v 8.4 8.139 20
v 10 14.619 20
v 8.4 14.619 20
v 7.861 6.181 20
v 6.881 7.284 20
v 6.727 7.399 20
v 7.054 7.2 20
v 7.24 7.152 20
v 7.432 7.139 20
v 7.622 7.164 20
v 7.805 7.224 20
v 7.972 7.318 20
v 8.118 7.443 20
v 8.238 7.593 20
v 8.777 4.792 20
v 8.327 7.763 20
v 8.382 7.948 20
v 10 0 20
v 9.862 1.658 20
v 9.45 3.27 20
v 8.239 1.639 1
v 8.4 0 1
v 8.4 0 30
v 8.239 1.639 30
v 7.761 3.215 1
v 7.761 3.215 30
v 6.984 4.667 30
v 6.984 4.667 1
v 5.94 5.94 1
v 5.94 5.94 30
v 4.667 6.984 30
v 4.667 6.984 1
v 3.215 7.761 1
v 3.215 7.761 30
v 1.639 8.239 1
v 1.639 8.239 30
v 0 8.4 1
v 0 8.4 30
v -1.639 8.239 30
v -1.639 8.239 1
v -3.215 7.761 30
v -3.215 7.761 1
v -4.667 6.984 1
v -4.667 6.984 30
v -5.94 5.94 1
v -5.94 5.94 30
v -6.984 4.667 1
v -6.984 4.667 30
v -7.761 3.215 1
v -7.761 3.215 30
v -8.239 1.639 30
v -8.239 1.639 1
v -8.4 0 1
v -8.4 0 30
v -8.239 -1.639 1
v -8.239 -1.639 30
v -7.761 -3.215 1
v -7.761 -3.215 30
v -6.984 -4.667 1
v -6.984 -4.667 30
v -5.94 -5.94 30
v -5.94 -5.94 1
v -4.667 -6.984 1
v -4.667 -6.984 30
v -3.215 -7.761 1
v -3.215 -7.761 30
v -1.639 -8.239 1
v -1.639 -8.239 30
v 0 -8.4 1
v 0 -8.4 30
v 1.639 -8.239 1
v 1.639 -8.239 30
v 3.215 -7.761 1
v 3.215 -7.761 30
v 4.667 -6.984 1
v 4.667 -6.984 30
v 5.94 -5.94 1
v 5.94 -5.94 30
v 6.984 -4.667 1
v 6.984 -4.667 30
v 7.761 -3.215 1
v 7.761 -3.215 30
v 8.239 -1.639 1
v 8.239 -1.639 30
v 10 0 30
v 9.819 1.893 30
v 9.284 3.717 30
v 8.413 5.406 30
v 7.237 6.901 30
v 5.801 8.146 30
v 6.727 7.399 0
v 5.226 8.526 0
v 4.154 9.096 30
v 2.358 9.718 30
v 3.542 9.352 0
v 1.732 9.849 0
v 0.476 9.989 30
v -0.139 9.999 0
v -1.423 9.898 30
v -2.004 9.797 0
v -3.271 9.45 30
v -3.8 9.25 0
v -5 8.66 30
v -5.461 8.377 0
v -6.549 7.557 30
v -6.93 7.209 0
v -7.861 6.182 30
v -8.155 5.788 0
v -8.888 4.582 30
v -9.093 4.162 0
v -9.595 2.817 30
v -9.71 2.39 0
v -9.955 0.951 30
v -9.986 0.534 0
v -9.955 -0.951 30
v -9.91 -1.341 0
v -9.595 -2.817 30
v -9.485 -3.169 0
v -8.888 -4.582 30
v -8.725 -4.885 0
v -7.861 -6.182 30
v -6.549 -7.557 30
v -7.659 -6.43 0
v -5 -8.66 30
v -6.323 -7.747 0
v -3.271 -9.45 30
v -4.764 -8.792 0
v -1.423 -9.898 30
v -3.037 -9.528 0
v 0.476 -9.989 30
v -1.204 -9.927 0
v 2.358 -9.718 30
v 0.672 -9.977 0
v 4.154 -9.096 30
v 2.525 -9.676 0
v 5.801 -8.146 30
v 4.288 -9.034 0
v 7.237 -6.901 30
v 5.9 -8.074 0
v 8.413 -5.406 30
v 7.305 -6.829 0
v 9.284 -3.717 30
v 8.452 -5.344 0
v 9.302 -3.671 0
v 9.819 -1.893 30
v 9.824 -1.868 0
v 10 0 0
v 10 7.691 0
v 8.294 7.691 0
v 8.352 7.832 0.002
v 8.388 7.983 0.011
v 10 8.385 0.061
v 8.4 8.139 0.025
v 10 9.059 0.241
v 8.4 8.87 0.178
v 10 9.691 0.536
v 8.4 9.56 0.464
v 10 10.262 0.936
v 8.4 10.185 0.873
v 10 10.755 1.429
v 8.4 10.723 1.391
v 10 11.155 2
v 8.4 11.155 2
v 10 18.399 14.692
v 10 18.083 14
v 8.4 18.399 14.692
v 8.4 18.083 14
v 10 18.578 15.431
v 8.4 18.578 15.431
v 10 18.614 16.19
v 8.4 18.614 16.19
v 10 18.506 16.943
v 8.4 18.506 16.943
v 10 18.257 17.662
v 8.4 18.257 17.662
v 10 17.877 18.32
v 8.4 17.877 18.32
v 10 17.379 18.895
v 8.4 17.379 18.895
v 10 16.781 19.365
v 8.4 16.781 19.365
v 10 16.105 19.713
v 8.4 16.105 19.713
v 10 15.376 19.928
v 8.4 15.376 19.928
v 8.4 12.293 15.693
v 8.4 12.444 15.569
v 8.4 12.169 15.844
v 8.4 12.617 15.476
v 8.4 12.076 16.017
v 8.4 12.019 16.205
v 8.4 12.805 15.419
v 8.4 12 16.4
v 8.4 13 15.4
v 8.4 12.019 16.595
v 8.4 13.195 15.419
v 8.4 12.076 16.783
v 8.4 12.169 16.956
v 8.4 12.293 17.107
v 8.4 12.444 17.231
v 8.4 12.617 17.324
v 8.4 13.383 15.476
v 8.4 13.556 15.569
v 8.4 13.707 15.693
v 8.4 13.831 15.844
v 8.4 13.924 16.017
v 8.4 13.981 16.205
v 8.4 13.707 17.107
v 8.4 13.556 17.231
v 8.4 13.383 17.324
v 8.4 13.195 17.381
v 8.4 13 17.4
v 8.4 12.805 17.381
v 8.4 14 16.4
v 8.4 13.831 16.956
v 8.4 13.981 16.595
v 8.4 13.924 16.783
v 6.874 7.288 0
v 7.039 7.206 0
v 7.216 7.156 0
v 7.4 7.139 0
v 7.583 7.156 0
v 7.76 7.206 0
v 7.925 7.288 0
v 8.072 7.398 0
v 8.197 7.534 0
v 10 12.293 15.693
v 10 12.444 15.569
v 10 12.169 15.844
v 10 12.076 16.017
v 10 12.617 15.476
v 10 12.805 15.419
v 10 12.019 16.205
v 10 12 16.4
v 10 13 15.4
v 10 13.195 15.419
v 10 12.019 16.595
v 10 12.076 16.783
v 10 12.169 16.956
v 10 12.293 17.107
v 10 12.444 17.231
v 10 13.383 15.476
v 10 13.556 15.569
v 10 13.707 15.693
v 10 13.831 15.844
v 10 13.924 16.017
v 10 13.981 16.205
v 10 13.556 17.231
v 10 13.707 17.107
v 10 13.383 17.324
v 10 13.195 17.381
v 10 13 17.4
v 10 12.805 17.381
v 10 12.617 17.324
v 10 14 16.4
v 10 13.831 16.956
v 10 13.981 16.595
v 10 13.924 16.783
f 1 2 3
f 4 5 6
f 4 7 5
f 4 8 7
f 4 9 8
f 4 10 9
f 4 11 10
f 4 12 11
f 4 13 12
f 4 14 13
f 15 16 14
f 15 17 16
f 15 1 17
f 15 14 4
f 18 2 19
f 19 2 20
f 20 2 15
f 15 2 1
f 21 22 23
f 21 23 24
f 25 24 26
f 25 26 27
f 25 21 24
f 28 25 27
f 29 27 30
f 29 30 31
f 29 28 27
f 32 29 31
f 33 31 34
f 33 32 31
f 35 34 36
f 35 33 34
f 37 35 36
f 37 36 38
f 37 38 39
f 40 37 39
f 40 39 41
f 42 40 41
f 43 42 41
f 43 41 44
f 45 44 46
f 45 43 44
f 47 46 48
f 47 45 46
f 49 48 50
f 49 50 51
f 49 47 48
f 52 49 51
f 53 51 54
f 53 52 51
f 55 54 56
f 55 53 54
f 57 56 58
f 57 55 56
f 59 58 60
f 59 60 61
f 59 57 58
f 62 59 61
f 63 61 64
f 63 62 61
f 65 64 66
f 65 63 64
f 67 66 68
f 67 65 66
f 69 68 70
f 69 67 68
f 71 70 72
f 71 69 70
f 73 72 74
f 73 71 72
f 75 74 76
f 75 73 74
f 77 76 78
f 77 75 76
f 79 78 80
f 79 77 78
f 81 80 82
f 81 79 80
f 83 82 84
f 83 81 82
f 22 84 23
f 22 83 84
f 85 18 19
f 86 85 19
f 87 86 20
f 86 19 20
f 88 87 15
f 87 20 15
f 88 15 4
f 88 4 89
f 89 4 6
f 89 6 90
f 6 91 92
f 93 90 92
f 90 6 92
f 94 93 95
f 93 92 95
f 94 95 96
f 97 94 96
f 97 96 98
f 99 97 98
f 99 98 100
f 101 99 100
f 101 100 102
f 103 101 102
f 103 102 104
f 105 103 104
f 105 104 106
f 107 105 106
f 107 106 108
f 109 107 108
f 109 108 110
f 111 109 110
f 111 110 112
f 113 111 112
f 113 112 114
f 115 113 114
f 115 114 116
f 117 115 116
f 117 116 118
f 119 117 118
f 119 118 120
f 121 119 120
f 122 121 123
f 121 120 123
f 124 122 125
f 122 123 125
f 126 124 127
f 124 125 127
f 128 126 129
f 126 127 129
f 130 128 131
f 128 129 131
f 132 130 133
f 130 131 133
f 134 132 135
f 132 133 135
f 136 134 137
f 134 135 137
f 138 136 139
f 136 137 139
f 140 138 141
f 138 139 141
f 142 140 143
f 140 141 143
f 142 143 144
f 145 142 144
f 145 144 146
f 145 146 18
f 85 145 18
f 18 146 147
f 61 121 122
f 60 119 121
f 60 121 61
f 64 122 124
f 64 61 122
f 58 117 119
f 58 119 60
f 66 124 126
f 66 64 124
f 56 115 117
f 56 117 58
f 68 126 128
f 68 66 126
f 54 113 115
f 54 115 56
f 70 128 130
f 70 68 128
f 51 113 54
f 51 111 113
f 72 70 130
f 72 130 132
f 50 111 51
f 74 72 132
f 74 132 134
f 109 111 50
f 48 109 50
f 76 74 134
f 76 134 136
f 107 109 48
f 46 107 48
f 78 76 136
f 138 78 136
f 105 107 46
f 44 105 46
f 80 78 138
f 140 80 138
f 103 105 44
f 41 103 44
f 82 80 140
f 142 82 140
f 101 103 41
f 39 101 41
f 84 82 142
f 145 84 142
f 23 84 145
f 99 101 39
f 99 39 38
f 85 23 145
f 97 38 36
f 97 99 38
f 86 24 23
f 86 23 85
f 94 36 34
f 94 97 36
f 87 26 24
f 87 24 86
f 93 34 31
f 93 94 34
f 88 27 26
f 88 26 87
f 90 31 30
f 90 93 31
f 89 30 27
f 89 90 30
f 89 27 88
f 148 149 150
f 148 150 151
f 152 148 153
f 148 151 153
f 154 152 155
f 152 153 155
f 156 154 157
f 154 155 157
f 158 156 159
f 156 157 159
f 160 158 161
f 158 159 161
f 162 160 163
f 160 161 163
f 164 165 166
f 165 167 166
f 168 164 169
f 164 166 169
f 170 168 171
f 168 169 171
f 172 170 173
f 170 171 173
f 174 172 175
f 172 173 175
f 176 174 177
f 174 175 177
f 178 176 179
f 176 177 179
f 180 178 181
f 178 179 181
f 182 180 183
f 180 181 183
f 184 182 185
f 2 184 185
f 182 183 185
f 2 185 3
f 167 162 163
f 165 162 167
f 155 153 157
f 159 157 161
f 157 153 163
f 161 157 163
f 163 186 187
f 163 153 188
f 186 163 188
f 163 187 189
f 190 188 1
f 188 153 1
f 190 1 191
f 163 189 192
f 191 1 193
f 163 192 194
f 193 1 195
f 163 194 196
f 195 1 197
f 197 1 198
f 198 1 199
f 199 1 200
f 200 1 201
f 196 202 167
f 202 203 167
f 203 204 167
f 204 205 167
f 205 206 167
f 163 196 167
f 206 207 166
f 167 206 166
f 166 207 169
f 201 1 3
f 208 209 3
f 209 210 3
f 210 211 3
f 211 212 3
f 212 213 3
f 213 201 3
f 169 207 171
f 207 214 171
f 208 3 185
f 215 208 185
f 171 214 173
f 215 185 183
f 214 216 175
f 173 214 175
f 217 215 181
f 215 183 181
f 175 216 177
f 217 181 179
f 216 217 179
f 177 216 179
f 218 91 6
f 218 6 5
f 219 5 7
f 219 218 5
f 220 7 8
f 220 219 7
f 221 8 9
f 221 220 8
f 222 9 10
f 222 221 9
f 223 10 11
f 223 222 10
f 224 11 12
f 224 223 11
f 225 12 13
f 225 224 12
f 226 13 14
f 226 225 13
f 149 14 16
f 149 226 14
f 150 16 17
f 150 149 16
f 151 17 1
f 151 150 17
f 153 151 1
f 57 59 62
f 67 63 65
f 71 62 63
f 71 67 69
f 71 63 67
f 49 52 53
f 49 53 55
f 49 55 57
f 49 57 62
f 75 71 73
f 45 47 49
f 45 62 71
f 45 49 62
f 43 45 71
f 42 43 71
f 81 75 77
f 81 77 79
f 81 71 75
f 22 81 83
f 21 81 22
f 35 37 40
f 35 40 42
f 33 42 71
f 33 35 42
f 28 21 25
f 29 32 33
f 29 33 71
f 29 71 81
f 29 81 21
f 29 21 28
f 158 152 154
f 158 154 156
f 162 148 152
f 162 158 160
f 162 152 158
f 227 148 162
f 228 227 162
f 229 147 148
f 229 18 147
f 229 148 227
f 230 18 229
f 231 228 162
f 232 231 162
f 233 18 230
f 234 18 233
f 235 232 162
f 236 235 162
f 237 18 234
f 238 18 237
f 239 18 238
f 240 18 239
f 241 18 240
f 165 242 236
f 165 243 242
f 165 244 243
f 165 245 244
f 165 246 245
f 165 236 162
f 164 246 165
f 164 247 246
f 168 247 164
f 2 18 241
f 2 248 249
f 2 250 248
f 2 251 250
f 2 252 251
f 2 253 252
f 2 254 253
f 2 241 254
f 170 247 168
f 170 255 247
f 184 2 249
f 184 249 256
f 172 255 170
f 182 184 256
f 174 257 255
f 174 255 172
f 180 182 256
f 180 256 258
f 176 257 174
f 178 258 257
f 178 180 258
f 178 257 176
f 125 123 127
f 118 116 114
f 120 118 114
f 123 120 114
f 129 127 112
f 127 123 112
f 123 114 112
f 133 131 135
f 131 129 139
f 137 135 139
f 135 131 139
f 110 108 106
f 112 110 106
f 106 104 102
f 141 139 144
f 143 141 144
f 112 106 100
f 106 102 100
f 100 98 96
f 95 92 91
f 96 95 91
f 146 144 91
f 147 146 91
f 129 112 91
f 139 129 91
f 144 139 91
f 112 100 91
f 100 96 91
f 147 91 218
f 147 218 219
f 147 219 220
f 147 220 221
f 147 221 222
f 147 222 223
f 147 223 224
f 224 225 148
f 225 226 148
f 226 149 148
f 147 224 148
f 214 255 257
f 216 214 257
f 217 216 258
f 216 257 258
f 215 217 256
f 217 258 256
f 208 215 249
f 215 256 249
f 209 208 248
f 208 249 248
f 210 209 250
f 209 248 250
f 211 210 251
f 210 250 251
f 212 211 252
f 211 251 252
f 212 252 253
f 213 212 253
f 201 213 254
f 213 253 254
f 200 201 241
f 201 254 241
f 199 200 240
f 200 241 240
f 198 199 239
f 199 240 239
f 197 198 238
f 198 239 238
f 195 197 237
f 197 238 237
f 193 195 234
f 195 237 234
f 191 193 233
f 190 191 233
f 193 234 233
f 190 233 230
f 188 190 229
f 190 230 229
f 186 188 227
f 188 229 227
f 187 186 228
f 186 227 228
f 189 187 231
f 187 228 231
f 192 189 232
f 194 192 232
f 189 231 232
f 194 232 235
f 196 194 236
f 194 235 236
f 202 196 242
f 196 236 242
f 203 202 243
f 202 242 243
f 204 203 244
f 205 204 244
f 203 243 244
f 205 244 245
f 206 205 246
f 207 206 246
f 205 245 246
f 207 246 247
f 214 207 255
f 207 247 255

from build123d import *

# Parameters (mm, degrees)
F0_R     = 10
F1_DEPTH = 1
F2_R     = 10
F2_R_2   = 8.4
F3_DEPTH = 29
F6_DEPTH = 1.6
F7_R     = 1
F8_DEPTH = 1.6
F9_R     = 4
F10_R    = 1


with BuildPart() as f1:
    # F0 (on Top) → F1 (new body)
    with BuildSketch(Plane.XY):
        Circle(F0_R)
    extrude(amount=F1_DEPTH)

    # F2 (on face) → F3 (join)
    with BuildSketch(Plane.XY.offset(1)):
        Circle(F2_R)
        Circle(F2_R_2, mode=Mode.SUBTRACT)
    extrude(amount=F3_DEPTH)

    # F5 (on offset) → F6 (join)
    with BuildSketch(Plane.YZ.offset(10)):
        Polygon((0, 20), (0, 0), (10, 0), (21.547005, 20), align=None)
    extrude(amount=-F6_DEPTH)

    # F7 (on face) → F8 (cut, through all)
    with BuildSketch(Plane.YZ.offset(10)):
        with Locations((13, 16.4)):
            Circle(F7_R)
    extrude(amount=-F8_DEPTH, mode=Mode.SUBTRACT)

    # F9
    f9_edges = [f1.edges().sort_by_distance(p)[0] for p in [
        (9.2, 21.547005, 20),
        (9.2, 10, 0),
    ]]
    fillet(f9_edges, radius=F9_R)

    # F10
    f10_edges = [f1.edges().sort_by_distance(p)[0] for p in [
        (8.4, 5.425864, 10),
    ]]
    fillet(f10_edges, radius=F10_R)


solid = f1.part
